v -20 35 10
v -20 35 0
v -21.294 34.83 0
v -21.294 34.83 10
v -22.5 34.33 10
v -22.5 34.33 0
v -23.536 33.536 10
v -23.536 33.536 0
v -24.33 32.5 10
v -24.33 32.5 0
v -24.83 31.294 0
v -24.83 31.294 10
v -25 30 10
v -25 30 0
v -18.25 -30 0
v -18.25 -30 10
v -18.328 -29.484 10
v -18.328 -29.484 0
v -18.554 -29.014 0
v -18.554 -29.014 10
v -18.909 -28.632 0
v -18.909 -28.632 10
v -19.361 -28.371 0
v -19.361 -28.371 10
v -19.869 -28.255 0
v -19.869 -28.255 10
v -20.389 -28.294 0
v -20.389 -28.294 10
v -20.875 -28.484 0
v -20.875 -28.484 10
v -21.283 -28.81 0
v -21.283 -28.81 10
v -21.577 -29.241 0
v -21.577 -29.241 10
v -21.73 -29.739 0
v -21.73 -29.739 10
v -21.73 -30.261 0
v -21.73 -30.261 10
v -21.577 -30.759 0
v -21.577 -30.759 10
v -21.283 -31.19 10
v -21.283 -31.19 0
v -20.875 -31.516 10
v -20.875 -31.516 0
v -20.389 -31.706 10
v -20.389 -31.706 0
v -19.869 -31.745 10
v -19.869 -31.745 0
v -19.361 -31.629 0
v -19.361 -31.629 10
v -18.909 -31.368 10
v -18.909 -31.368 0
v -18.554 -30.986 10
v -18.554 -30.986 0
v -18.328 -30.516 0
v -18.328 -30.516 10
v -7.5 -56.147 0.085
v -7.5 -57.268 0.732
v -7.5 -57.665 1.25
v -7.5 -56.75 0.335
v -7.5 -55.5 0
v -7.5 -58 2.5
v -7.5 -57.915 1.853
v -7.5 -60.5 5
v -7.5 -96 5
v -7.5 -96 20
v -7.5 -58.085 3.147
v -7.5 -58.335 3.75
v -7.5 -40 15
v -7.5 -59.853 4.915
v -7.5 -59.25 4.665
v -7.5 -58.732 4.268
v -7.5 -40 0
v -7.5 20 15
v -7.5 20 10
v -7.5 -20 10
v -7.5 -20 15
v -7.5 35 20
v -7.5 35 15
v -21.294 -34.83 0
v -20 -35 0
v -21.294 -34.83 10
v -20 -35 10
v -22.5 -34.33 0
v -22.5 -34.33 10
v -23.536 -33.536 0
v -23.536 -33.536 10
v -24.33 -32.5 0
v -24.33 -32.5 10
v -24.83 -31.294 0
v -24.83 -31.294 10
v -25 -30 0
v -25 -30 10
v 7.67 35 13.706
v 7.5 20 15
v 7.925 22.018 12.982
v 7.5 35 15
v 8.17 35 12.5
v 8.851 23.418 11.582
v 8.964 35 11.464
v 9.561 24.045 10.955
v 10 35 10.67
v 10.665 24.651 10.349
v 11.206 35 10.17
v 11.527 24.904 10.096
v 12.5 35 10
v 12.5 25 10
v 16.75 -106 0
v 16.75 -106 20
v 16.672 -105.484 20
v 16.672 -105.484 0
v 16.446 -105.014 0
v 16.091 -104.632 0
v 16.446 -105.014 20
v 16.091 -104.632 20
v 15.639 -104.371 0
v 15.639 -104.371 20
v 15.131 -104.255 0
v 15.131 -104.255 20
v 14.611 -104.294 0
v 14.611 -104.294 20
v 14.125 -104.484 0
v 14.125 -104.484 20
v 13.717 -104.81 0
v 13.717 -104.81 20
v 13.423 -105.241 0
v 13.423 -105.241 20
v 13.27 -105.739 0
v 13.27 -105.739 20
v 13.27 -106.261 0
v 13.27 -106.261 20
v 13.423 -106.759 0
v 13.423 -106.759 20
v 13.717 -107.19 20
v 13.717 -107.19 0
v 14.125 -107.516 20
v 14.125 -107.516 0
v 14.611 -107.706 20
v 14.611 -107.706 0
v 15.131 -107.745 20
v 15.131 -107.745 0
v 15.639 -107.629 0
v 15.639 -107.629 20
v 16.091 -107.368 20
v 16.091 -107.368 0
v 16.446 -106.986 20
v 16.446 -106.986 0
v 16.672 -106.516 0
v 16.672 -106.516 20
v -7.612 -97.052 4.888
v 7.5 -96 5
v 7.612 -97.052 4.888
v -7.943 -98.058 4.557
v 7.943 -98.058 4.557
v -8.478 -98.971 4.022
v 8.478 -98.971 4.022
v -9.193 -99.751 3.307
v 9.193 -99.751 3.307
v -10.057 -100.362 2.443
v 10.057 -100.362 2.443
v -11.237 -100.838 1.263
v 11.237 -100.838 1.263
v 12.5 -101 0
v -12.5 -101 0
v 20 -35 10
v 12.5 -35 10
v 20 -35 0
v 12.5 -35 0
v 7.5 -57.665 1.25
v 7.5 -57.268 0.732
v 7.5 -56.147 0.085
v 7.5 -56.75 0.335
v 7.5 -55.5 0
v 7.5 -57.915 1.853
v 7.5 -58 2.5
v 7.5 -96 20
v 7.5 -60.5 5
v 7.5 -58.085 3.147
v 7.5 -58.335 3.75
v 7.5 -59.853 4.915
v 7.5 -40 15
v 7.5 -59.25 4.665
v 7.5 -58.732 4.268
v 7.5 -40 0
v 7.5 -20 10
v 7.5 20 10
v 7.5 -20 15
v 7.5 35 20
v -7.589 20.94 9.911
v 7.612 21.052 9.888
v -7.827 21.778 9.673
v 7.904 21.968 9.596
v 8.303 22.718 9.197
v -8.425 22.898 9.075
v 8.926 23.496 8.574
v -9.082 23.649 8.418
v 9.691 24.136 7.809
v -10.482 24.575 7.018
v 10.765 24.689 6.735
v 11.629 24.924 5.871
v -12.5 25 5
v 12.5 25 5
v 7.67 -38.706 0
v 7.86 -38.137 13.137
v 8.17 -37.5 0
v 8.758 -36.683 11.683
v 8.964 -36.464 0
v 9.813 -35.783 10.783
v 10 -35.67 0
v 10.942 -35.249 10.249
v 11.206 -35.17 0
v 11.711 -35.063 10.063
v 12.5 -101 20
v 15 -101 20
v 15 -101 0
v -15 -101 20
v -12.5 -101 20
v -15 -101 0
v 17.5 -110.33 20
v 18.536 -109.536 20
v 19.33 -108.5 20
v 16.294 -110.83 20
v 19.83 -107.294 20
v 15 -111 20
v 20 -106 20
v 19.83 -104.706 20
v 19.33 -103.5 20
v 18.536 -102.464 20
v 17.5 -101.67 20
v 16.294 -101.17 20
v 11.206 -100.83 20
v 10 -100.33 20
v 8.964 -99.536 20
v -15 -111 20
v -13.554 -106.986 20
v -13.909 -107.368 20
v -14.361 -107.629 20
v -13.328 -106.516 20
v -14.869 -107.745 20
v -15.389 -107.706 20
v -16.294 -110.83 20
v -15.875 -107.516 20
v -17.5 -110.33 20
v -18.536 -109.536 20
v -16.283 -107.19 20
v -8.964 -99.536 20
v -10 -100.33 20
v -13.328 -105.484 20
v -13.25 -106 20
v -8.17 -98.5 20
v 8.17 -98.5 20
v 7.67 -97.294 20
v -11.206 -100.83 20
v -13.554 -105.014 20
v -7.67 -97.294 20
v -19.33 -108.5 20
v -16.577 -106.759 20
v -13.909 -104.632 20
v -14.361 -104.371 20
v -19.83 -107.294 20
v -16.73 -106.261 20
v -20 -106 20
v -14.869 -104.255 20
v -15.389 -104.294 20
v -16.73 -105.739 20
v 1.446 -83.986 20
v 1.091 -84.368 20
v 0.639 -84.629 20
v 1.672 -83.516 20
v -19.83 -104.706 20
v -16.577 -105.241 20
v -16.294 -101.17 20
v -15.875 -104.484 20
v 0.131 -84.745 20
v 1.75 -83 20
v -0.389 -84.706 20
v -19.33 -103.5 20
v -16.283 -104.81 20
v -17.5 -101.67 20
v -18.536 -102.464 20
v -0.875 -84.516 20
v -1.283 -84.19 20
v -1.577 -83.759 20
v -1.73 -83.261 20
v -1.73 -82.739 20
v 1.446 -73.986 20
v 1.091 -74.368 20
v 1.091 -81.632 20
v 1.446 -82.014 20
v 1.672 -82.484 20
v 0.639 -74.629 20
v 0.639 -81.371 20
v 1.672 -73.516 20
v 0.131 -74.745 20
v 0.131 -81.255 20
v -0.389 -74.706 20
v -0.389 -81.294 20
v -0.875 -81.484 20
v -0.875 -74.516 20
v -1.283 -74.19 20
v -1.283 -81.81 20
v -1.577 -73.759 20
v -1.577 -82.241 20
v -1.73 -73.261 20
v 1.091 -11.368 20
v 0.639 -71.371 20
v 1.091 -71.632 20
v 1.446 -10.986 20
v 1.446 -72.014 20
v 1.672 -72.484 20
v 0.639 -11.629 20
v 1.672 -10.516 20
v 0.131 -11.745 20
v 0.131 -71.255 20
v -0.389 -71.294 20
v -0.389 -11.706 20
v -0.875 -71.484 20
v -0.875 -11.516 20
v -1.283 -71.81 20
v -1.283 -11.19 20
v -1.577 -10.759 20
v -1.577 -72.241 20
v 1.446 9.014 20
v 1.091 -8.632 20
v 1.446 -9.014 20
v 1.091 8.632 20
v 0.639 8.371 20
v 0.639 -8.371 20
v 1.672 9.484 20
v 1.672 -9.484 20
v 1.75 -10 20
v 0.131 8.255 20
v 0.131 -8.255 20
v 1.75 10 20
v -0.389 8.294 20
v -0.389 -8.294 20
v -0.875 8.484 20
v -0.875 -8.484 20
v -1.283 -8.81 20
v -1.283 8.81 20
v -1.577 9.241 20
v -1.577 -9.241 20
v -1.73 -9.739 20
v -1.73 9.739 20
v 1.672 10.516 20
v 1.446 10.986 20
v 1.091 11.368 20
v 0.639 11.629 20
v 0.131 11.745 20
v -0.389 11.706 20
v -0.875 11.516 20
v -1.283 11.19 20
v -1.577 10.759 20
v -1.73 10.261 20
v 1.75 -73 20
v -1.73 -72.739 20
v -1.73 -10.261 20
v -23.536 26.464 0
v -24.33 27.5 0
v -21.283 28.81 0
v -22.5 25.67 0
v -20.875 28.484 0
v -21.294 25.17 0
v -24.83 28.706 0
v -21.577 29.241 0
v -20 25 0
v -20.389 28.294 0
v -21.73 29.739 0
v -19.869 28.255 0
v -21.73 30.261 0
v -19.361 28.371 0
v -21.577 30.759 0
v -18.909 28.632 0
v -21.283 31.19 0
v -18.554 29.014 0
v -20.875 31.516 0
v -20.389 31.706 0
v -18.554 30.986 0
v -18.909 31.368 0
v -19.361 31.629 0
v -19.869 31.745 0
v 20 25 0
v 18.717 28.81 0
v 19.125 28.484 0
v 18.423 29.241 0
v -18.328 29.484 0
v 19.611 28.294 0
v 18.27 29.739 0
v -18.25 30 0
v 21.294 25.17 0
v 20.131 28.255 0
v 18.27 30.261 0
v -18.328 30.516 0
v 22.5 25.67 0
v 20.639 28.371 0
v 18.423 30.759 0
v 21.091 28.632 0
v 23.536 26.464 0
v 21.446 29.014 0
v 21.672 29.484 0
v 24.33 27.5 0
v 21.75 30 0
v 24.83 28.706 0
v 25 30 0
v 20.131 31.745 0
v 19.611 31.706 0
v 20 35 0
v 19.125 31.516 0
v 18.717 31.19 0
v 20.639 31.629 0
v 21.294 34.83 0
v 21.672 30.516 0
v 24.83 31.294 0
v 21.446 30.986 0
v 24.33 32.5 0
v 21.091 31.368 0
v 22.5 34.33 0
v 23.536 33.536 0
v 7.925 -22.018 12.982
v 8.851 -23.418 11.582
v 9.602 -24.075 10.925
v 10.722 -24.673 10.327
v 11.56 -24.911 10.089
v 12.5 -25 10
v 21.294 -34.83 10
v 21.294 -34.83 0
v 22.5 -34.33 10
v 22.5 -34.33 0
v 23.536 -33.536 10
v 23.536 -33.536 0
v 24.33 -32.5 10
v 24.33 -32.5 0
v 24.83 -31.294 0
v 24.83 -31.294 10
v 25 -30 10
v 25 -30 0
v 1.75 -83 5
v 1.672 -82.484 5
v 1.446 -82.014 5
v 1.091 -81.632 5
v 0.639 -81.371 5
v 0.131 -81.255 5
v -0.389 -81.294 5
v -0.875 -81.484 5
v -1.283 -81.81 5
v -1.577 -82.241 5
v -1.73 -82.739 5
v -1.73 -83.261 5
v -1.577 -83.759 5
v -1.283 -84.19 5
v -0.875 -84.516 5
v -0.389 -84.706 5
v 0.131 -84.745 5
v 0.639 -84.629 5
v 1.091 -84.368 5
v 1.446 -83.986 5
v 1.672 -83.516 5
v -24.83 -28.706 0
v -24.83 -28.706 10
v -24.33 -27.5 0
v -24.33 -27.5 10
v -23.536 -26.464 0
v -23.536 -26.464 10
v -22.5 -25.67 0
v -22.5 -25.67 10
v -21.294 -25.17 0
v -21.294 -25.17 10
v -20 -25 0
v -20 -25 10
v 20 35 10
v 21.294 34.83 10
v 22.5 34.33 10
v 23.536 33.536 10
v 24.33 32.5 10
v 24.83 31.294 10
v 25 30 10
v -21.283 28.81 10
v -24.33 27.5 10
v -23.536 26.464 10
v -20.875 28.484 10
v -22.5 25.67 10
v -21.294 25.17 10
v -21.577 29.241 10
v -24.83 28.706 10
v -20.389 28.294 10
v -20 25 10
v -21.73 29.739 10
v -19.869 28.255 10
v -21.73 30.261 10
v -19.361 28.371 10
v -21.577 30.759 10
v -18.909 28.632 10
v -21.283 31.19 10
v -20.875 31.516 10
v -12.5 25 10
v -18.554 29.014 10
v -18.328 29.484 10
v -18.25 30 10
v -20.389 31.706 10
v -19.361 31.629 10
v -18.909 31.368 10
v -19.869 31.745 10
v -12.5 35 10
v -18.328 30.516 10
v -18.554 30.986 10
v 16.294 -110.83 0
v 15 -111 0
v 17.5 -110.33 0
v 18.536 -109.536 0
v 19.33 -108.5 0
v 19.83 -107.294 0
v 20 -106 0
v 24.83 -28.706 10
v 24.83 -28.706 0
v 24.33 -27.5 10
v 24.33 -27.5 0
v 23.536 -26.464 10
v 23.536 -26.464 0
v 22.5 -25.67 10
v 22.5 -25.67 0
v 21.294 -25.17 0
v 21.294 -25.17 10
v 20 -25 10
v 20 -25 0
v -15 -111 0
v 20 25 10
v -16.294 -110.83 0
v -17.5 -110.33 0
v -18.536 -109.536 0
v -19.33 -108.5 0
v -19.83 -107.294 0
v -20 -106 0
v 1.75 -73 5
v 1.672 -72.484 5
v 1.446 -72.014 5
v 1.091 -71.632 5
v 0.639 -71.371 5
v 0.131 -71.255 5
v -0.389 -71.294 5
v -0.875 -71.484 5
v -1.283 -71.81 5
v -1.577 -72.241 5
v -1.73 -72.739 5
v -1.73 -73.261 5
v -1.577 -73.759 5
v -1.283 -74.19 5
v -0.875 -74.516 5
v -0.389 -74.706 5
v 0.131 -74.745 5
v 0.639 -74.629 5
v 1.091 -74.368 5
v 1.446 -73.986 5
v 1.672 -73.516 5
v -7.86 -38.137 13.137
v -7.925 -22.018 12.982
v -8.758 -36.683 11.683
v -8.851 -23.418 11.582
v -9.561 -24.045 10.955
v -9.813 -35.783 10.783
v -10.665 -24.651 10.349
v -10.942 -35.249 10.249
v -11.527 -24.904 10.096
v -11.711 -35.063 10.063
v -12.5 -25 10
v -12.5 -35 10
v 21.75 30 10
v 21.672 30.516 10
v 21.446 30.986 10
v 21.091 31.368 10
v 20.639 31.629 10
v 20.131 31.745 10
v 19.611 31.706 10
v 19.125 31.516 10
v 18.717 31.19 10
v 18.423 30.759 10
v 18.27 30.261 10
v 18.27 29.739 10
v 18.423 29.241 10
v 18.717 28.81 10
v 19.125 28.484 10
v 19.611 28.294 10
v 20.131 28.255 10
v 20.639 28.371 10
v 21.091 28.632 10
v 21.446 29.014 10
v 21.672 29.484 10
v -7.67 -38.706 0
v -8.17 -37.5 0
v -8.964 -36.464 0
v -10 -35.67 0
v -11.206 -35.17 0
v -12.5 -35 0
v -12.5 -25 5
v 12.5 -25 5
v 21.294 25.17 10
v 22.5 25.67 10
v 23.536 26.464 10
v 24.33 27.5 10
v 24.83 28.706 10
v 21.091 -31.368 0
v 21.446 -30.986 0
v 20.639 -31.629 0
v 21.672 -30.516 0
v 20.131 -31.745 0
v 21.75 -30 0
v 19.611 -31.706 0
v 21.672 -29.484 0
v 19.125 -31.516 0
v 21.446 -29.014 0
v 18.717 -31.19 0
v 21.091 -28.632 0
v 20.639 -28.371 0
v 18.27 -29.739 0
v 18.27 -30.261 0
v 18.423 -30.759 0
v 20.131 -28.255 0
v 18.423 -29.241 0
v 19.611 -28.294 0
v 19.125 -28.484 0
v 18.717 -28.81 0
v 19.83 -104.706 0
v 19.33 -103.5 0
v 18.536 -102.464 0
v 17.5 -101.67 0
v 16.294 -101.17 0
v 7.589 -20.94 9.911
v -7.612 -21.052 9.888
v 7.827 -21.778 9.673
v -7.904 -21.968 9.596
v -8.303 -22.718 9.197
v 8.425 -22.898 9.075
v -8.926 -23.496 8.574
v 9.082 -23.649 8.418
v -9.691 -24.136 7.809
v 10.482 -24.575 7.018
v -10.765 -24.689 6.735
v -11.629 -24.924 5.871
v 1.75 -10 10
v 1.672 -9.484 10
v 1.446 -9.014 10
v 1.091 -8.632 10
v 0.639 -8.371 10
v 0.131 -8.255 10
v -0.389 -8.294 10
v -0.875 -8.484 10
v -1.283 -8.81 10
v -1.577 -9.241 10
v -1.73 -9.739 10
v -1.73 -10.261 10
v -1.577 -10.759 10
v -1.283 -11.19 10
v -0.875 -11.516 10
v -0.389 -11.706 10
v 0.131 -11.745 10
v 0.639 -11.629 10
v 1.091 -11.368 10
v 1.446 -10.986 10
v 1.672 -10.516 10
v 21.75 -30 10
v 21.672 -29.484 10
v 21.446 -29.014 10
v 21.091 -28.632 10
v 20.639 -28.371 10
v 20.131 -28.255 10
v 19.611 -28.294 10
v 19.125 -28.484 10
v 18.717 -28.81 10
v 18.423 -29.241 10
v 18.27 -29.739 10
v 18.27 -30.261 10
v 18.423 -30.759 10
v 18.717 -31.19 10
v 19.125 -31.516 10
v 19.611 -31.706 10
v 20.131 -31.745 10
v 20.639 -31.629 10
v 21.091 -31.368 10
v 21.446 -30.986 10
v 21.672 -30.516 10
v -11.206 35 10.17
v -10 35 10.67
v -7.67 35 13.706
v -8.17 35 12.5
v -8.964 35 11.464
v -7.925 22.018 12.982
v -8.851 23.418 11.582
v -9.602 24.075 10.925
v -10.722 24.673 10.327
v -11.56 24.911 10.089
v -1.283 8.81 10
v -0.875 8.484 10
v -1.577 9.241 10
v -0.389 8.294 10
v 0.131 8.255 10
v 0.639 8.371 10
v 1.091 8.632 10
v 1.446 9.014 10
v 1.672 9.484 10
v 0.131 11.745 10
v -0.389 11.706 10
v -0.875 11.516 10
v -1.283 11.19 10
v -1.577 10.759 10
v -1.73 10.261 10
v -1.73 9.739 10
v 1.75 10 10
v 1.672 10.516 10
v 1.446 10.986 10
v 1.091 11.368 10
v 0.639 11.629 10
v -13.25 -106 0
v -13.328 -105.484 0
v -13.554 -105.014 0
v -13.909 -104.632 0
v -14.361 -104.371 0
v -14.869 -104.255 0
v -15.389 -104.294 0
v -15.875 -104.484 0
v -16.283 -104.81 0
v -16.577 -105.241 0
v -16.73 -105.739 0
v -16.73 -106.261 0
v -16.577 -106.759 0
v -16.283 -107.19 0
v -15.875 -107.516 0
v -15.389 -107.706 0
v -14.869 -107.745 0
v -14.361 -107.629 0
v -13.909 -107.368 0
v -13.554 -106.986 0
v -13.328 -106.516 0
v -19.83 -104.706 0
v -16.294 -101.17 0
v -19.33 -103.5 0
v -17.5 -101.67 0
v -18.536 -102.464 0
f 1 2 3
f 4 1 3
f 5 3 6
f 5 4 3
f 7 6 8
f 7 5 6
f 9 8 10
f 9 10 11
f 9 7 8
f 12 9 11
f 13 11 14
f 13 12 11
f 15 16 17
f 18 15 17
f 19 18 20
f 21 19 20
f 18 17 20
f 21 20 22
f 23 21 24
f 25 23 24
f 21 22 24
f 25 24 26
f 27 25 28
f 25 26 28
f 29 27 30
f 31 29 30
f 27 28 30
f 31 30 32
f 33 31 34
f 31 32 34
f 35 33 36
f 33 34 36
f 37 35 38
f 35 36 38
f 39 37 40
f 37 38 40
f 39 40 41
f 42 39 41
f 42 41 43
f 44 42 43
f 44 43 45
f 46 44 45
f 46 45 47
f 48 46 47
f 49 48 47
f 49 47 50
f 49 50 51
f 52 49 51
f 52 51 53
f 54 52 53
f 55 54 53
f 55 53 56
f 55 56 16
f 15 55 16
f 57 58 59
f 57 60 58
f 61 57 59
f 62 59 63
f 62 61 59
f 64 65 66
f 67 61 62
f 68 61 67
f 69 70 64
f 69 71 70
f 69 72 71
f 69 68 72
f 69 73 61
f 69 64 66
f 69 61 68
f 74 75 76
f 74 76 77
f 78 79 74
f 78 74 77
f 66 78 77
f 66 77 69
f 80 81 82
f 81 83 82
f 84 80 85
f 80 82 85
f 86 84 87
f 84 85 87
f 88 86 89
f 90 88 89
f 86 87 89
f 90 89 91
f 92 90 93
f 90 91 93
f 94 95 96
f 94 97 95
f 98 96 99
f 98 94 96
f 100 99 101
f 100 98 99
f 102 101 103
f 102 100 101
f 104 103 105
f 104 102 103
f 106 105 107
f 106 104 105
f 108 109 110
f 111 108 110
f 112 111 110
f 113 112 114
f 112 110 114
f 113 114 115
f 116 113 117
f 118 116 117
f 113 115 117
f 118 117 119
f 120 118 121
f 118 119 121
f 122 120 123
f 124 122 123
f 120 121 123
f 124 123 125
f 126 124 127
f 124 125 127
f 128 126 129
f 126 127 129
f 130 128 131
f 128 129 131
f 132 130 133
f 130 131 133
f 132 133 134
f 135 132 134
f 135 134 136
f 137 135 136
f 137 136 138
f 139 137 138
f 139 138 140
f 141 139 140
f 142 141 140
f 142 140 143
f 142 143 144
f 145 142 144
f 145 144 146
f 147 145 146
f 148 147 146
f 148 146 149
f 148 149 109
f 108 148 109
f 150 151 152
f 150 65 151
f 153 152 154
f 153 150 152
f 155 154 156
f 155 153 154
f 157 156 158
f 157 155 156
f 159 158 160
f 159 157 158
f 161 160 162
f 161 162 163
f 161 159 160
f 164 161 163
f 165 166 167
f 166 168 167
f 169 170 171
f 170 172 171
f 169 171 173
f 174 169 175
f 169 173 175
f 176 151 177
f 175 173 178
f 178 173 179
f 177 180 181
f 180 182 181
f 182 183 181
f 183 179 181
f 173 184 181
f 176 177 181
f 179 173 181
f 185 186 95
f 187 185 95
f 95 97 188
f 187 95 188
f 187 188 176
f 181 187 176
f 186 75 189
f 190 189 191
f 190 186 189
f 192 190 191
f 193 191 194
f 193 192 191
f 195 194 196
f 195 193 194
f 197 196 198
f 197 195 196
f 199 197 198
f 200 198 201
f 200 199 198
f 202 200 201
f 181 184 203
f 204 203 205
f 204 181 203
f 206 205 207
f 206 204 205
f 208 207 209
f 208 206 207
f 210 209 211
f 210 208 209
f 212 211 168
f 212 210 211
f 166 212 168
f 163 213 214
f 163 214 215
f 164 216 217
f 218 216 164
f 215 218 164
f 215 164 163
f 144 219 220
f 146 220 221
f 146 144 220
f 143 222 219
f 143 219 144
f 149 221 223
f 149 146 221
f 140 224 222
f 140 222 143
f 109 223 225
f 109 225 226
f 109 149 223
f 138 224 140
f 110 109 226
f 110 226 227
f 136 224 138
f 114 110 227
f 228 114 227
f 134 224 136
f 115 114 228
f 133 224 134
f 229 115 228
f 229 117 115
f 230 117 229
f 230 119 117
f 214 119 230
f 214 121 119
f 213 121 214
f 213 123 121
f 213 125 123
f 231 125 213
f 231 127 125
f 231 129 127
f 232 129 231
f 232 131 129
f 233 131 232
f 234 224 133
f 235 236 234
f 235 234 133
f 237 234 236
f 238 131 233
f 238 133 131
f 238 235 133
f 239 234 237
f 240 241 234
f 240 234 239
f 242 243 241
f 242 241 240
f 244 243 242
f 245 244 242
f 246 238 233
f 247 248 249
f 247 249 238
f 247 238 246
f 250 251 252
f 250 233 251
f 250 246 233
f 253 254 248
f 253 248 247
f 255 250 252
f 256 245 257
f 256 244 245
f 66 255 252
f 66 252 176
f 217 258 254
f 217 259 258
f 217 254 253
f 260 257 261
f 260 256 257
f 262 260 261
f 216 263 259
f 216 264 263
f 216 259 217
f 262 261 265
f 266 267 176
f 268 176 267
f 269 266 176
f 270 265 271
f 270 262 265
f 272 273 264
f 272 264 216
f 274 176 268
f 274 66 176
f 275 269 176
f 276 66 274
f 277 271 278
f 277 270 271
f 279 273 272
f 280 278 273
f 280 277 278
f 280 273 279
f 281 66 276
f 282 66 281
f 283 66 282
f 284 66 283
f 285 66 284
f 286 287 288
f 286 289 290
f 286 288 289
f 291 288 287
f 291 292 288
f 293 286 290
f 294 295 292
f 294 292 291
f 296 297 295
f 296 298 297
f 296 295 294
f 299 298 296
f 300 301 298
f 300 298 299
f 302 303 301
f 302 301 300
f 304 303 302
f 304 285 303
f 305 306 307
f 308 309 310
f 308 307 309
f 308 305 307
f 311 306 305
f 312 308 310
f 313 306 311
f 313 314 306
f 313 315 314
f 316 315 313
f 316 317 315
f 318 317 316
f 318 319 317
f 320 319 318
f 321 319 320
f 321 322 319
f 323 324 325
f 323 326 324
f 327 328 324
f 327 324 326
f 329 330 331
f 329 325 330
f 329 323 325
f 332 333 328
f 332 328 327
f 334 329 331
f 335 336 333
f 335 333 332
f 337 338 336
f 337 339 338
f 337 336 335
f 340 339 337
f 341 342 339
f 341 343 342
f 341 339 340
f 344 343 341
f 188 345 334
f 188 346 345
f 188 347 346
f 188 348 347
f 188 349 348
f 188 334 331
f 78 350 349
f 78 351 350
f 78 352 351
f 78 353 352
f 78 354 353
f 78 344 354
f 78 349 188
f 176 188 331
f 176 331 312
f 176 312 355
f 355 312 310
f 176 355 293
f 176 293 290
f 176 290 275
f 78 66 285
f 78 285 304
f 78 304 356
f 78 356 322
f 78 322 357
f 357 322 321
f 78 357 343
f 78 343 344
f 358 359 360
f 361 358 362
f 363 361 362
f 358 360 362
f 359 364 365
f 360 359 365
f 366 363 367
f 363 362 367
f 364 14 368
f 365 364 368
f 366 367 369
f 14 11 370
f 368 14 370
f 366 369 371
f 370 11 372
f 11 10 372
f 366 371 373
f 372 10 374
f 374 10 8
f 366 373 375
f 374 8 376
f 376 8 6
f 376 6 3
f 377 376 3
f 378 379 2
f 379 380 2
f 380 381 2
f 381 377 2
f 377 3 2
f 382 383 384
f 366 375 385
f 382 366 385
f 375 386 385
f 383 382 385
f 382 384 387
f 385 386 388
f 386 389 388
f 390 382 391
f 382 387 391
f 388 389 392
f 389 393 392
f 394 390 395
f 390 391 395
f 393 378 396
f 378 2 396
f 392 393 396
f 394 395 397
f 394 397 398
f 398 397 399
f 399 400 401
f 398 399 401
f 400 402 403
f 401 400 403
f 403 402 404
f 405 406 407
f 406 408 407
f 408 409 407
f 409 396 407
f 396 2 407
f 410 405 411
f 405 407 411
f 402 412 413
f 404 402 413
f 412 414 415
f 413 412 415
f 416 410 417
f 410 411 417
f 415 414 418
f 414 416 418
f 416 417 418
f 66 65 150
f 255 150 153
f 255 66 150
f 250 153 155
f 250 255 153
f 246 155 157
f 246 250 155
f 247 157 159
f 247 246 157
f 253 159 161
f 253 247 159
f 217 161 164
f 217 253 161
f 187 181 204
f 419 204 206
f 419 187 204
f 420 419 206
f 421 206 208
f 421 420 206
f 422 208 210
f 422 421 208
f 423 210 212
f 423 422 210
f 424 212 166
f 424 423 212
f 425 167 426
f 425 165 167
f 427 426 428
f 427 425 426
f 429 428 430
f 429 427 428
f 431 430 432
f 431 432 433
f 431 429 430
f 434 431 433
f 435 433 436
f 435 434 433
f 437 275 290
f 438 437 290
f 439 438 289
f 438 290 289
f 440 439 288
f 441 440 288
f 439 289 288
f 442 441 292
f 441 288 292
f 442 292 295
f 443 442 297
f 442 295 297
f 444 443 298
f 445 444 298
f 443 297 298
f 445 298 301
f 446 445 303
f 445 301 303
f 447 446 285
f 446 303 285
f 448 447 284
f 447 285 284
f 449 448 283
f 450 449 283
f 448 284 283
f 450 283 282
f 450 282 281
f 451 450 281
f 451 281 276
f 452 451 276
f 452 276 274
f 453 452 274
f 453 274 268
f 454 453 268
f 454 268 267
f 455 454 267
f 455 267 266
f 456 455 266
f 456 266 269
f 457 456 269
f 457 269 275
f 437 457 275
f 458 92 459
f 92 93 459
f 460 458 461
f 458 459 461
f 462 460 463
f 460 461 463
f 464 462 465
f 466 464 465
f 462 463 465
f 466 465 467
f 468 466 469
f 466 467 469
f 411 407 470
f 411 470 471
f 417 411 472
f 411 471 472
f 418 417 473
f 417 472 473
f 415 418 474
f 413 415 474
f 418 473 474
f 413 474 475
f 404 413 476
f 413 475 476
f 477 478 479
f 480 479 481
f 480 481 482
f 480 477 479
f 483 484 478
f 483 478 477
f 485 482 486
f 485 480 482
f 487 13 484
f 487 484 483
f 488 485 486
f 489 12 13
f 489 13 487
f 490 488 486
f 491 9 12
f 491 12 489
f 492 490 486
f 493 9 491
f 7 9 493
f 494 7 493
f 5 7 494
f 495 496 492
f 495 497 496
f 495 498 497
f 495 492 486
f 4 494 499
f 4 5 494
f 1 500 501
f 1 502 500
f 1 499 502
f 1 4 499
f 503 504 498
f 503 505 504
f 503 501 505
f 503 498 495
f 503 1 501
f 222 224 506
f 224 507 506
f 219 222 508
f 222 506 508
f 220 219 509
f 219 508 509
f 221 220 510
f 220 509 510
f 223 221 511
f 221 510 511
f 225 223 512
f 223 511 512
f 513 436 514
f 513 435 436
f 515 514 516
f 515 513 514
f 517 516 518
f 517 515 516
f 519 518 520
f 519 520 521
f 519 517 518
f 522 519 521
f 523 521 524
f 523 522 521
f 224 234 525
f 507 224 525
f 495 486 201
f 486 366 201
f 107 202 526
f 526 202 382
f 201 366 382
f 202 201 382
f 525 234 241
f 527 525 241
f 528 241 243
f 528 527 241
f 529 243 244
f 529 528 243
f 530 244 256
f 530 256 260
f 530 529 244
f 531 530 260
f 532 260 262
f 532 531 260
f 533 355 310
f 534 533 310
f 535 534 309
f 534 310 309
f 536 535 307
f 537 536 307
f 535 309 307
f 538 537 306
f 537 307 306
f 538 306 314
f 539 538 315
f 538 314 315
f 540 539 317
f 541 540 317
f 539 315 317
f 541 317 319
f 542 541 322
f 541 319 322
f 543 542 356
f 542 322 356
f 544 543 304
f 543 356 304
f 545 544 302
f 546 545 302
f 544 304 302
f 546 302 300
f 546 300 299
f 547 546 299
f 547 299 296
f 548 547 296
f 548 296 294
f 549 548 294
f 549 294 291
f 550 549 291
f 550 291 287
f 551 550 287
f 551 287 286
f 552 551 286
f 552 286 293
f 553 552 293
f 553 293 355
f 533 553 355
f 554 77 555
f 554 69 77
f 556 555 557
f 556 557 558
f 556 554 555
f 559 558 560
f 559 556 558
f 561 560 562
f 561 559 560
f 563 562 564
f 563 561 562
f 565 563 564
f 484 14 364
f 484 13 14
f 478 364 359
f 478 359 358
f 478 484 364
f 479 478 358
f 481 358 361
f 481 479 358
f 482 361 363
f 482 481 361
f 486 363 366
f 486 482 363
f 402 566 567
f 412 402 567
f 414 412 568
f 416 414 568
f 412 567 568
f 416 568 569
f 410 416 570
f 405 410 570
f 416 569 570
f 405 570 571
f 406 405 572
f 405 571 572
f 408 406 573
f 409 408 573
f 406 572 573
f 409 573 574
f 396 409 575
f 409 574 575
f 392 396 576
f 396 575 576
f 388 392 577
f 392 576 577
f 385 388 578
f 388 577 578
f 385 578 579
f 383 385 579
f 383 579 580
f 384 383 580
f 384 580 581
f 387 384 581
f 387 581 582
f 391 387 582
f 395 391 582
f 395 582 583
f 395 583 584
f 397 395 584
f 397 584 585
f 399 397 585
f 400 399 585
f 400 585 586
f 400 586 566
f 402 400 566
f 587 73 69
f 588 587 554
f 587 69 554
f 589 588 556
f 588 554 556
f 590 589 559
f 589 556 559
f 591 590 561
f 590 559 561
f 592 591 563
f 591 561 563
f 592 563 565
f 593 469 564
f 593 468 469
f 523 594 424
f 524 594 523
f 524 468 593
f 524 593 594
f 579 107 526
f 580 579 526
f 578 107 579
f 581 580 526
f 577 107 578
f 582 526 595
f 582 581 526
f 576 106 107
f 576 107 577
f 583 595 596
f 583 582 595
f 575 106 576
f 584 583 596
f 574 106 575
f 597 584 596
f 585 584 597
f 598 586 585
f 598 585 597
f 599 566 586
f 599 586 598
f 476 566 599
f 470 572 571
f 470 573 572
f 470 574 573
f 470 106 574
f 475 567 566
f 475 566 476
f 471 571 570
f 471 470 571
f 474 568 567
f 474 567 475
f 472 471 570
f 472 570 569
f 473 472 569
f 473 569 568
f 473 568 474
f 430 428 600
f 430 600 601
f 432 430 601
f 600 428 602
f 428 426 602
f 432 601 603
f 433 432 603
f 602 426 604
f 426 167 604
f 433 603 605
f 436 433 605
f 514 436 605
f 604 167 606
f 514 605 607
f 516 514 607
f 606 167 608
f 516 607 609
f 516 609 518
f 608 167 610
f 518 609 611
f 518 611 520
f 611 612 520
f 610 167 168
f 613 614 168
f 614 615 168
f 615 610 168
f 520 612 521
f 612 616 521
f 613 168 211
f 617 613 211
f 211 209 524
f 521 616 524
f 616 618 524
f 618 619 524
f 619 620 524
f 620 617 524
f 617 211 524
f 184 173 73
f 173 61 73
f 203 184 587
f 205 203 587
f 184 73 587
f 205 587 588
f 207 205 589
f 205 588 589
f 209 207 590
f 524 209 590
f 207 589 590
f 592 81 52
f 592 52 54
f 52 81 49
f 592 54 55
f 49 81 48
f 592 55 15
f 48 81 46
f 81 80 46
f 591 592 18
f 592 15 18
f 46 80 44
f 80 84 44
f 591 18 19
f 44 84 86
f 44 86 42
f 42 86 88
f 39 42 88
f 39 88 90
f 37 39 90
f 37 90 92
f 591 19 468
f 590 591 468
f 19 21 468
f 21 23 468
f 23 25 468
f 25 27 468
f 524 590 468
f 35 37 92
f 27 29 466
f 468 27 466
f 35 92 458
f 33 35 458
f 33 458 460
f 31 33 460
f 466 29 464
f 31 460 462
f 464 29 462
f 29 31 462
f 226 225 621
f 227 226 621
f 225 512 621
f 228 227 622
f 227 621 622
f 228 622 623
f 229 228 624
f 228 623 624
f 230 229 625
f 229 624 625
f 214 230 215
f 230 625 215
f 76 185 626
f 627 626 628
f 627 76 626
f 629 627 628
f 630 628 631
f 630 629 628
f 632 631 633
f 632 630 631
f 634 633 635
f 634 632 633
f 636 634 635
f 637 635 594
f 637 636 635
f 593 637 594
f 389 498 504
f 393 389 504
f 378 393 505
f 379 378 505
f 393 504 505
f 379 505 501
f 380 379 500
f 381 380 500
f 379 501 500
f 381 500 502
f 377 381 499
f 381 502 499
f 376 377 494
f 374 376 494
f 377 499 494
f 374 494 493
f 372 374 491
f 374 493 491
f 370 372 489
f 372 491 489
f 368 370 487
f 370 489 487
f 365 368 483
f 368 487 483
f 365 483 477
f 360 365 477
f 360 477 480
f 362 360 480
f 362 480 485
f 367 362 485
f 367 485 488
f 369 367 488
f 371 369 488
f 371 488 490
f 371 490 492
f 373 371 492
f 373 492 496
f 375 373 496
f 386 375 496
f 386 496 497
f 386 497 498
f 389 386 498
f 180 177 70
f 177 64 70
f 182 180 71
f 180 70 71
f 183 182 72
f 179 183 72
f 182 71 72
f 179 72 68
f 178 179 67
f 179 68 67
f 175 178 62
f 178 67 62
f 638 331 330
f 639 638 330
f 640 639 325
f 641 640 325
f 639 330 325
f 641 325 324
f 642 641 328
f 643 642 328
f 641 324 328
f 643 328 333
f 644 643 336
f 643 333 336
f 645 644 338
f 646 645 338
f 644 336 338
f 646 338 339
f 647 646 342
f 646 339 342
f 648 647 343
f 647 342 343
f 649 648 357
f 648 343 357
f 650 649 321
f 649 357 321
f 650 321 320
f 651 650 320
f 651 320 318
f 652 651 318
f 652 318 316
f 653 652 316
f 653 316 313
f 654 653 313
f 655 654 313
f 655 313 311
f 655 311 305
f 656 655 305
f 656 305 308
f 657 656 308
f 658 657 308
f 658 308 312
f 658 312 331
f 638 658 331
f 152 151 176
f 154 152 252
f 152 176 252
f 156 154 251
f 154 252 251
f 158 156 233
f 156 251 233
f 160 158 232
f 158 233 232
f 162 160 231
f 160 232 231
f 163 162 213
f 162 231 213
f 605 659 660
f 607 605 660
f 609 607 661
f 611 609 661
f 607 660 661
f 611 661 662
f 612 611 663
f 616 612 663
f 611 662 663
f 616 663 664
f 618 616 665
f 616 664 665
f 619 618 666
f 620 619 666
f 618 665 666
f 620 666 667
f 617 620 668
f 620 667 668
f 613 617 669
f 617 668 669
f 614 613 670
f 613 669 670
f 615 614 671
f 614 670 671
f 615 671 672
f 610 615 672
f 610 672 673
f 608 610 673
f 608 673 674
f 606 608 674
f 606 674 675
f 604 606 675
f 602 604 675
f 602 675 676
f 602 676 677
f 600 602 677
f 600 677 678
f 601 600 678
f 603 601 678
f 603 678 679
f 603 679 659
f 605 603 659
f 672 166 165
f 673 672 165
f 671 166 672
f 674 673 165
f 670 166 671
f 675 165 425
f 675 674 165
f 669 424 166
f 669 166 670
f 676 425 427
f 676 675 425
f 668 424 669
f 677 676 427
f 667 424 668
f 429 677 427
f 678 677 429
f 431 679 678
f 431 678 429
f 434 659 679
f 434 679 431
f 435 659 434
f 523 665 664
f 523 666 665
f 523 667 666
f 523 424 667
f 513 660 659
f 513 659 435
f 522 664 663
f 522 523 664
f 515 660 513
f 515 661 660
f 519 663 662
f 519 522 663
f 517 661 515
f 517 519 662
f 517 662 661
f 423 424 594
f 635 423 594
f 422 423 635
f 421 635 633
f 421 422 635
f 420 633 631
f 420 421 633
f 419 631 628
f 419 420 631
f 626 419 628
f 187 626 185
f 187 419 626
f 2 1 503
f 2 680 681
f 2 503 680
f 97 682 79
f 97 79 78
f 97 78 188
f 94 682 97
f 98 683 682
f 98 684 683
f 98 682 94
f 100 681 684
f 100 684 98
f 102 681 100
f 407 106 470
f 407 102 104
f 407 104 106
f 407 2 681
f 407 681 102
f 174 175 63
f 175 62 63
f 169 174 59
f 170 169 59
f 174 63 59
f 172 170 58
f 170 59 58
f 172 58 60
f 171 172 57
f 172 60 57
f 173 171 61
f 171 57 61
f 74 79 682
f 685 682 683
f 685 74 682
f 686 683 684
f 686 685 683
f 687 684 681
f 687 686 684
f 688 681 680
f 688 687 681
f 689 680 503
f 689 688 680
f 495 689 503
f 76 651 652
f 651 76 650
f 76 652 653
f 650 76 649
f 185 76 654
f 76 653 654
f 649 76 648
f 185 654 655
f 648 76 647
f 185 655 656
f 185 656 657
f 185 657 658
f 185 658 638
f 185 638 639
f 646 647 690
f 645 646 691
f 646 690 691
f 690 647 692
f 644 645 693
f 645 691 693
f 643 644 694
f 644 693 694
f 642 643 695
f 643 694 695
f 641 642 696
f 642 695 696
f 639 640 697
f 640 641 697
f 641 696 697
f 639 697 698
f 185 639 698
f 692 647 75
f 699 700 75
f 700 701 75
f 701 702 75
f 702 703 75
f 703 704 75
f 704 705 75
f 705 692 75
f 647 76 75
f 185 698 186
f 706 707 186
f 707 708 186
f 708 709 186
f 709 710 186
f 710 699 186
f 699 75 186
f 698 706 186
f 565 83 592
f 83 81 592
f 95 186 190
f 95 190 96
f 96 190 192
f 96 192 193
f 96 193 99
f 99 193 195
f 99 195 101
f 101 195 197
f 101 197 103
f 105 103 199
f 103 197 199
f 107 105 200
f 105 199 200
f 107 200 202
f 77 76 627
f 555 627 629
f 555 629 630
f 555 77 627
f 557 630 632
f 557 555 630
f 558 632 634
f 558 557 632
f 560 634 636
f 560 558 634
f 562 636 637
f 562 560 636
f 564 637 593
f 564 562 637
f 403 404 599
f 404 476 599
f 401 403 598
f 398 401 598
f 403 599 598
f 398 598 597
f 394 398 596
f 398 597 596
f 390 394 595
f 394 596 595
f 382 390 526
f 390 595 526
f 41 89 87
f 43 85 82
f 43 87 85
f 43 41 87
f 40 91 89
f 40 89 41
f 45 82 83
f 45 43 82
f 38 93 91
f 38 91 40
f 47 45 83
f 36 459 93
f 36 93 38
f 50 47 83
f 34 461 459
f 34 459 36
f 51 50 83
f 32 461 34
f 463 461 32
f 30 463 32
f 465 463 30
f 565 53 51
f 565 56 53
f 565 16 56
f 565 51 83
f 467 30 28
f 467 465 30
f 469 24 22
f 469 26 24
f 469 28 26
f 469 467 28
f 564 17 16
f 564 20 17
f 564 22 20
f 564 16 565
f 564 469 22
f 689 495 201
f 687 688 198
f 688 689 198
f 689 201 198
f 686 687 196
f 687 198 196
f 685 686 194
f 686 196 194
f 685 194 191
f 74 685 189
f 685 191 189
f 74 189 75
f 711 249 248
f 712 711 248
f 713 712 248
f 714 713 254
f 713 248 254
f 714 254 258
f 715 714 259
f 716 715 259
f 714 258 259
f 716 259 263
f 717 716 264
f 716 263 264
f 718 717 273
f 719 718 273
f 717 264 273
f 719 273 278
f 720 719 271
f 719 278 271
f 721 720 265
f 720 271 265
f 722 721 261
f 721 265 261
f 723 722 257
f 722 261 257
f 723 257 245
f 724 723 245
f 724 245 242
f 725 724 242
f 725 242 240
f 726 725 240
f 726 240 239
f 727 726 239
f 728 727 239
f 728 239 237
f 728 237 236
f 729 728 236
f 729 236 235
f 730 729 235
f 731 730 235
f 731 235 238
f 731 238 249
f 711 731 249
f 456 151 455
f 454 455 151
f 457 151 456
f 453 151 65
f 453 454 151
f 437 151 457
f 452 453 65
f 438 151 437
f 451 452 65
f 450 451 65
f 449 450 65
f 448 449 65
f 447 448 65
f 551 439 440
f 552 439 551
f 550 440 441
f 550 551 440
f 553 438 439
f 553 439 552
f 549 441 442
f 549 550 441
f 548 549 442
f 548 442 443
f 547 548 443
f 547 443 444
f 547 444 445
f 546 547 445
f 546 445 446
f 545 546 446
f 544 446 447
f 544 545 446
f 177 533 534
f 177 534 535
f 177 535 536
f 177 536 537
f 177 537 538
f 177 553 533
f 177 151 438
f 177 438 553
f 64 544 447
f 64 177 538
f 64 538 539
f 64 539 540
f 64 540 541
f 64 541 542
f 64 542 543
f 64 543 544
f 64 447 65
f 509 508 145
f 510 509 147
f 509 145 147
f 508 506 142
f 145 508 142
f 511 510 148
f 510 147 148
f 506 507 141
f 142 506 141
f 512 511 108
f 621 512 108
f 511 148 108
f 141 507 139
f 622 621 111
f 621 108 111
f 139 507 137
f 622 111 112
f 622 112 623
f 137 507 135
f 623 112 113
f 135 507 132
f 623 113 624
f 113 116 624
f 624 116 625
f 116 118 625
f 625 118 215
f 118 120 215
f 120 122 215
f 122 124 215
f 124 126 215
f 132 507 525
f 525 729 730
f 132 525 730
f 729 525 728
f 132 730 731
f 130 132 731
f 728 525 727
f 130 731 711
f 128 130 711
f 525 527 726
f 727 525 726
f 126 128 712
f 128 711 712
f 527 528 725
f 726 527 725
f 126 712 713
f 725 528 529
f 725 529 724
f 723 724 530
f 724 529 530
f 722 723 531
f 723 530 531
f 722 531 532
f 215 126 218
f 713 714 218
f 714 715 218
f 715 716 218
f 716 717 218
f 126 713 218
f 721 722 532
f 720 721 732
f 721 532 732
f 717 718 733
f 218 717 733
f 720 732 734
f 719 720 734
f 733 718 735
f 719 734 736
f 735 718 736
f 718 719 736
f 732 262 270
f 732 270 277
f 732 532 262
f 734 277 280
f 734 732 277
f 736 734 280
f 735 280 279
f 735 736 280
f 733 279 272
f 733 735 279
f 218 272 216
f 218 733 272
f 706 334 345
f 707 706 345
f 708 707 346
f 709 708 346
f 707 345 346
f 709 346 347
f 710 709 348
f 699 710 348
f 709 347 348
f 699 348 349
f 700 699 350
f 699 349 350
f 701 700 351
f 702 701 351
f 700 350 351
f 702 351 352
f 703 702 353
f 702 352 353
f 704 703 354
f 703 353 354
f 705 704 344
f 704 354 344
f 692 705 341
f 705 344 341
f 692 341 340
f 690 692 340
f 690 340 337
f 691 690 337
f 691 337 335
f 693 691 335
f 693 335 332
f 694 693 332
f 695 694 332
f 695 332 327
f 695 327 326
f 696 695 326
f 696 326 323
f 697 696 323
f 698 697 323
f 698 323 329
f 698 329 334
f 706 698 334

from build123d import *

# Parameters (mm, degrees)
SKETCH1_W                = 50
SKETCH1_H                = 10
BOSS_EXTRUDE1_DEPTH      = 10
BOSS_EXTRUDE1_2_DEPTH    = 10
SKETCH2_W                = 15
SKETCH2_H                = 70
BOSS_EXTRUDE2_DEPTH      = 10
CUT_EXTRUDE1_REACH       = 49.434
SKETCH3_R                = 1.75
CUT_EXTRUDE2_REACH       = 46.159
SKETCH4_R                = 1.75
FILLET2_R                = 5
FILLET4_R                = 5
FILLET5_R                = 5
FILLET6_R                = 5
SKETCH5_W                = 15
SKETCH5_H                = 20
BOSS_EXTRUDE3_DEPTH      = 66
BOSS_EXTRUDE4_DEPTH      = 20
BOSS_EXTRUDE4_DEPTH_BACK = 20
SKETCH6_W                = 20
SKETCH6_H                = 10
CUT_EXTRUDE3_REACH       = 117.525
SKETCH7_R                = 1.75
FILLET7_R                = 5
FILLET9_R                = 5
FILLET10_R               = 5
SKETCH8_R                = 1.75
CUT_EXTRUDE4_DEPTH       = 116.524889093
SKETCH11_W               = 15
SKETCH11_H               = 43
CUT_EXTRUDE5_DEPTH       = 5
FILLET11_R               = 5
FILLET13_R               = 2.5


# Some blends are built 0.0001 mm under size
with BuildPart() as part:
    # Sketch1 → Boss-Extrude1 (new body)
    with BuildSketch(Plane.XY):
        with Locations((0, 30)):
            Rectangle(SKETCH1_W, SKETCH1_H)
    extrude(amount=BOSS_EXTRUDE1_DEPTH)



with BuildPart() as body_2:
    # Sketch1 → Boss-Extrude1 2 (new body)
    with BuildSketch(Plane.XY):
        with Locations((0, -30)):
            Rectangle(SKETCH1_W, SKETCH1_H)
    extrude(amount=BOSS_EXTRUDE1_2_DEPTH)


with BuildPart() as part_1:
    add(part.part)

    add(body_2.part)  # Boss-Extrude2 merges body 2
    # Sketch2 → Boss-Extrude2 (add)
    with BuildSketch(Plane.XY.offset(10)):
        Rectangle(SKETCH2_W, SKETCH2_H)
    extrude(amount=BOSS_EXTRUDE2_DEPTH)

    # Sketch3 → Cut-Extrude1 (cut, up to next)
    with BuildSketch(Plane.XY.offset(20), mode=Mode.PRIVATE) as cut_extrude1_sk1:
        with Locations((0, 10)):
            Circle(SKETCH3_R)
    cut_extrude1_tool1 = extrude(cut_extrude1_sk1.sketch, amount=-CUT_EXTRUDE1_REACH, mode=Mode.PRIVATE) & part_1.part
    # Sketch3 → Cut-Extrude1 (cut, up to next)
    with BuildSketch(Plane.XY.offset(20), mode=Mode.PRIVATE) as cut_extrude1_sk2:
        with Locations((0, -10)):
            Circle(SKETCH3_R)
    cut_extrude1_tool2 = extrude(cut_extrude1_sk2.sketch, amount=-CUT_EXTRUDE1_REACH, mode=Mode.PRIVATE) & part_1.part
    add(cut_extrude1_tool1.solids().sort_by_distance((0, 10, 20))[0], mode=Mode.SUBTRACT)
    add(cut_extrude1_tool2.solids().sort_by_distance((0, -10, 20))[0], mode=Mode.SUBTRACT)

    # Sketch4 → Cut-Extrude2 (cut, up to next)
    with BuildSketch(Plane.XY.offset(10), mode=Mode.PRIVATE) as cut_extrude2_sk1:
        with Locations((-20, 30)):
            Circle(SKETCH4_R)
    cut_extrude2_tool1 = extrude(cut_extrude2_sk1.sketch, amount=-CUT_EXTRUDE2_REACH, mode=Mode.PRIVATE) & part_1.part
    # Sketch4 → Cut-Extrude2 (cut, up to next)
    with BuildSketch(Plane.XY.offset(10), mode=Mode.PRIVATE) as cut_extrude2_sk2:
        with Locations((-20, -30)):
            Circle(SKETCH4_R)
    cut_extrude2_tool2 = extrude(cut_extrude2_sk2.sketch, amount=-CUT_EXTRUDE2_REACH, mode=Mode.PRIVATE) & part_1.part
    # Sketch4 → Cut-Extrude2 (cut, up to next)
    with BuildSketch(Plane.XY.offset(10), mode=Mode.PRIVATE) as cut_extrude2_sk3:
        with Locations((20, 30)):
            Circle(SKETCH4_R)
    cut_extrude2_tool3 = extrude(cut_extrude2_sk3.sketch, amount=-CUT_EXTRUDE2_REACH, mode=Mode.PRIVATE) & part_1.part
    # Sketch4 → Cut-Extrude2 (cut, up to next)
    with BuildSketch(Plane.XY.offset(10), mode=Mode.PRIVATE) as cut_extrude2_sk4:
        with Locations((20, -30)):
            Circle(SKETCH4_R)
    cut_extrude2_tool4 = extrude(cut_extrude2_sk4.sketch, amount=-CUT_EXTRUDE2_REACH, mode=Mode.PRIVATE) & part_1.part
    add(cut_extrude2_tool1.solids().sort_by_distance((-20, 30, 10))[0], mode=Mode.SUBTRACT)
    add(cut_extrude2_tool2.solids().sort_by_distance((-20, -30, 10))[0], mode=Mode.SUBTRACT)
    add(cut_extrude2_tool3.solids().sort_by_distance((20, 30, 10))[0], mode=Mode.SUBTRACT)
    add(cut_extrude2_tool4.solids().sort_by_distance((20, -30, 10))[0], mode=Mode.SUBTRACT)

    # Fillet2
    fillet2_edges = [part_1.edges().sort_by_distance(p)[0] for p in [
        (25, -35, 5),
        (25, -25, 5),
        (25, 35, 5),
        (25, 25, 5),
        (-25, 35, 5),
        (-25, 25, 5),
        (-25, -25, 5),
        (-25, -35, 5),
    ]]
    fillet(fillet2_edges, radius=FILLET2_R - 0.0001)  # a hair under: the kernel refuses the full size

    # Fillet4
    # the kernel refuses this fillet: 5 mm, written as the material it adds along each edge
    with BuildSketch(Plane(origin=(7.5, 25, 10), x_dir=(0, 0, -1), z_dir=(-1, 0, 0))) as fillet4_piece_1:
        with BuildLine():
            CenterArc((FILLET4_R, FILLET4_R), FILLET4_R, 180, 90)
            Line((0, FILLET4_R), (0, 0))
            Line((0, 0), (FILLET4_R, 0))
        make_face()
    extrude(amount=15)
    with BuildSketch(Plane(origin=(-7.5, -25, 10), x_dir=(0, 1, 0), z_dir=(1, 0, 0))) as fillet4_piece_2:
        with BuildLine():
            CenterArc((FILLET4_R, -FILLET4_R), FILLET4_R, 90, 90)
            Line((0, -FILLET4_R), (0, 0))
            Line((0, 0), (FILLET4_R, 0))
        make_face()
    extrude(amount=15)

    # Fillet5
    fillet5_edges = [part_1.edges().sort_by_distance(p)[0] for p in [
        (7.5, -25, 7.5),
        (7.5, 25, 7.5),
    ]]
    fillet(fillet5_edges, radius=FILLET5_R - 0.0001)  # a hair under: the kernel refuses the full size

    # Fillet6
    fillet6_edges = [part_1.edges().sort_by_distance(p)[0] for p in [
        (-7.5, -25, 7.5),
        (-7.5, 25, 7.5),
    ]]
    fillet(fillet6_edges, radius=FILLET6_R - 0.0001)  # a hair under: the kernel refuses the full size

    # Sketch5 → Boss-Extrude3 (add)
    with BuildSketch(Plane.XZ.offset(35)):
        with Locations((0, 10)):
            Rectangle(SKETCH5_W, SKETCH5_H)
    extrude(amount=BOSS_EXTRUDE3_DEPTH)

    # Sketch6 → Boss-Extrude4 (add, two sides: drawn at the far end of the back side and taken through both)
    with BuildSketch(Plane(origin=(0, 0, 0), x_dir=(0, 0, -1), z_dir=(1, 0, 0)).offset(-BOSS_EXTRUDE4_DEPTH_BACK)):
        with Locations((-10, -106)):
            Rectangle(SKETCH6_W, SKETCH6_H)
    extrude(amount=BOSS_EXTRUDE4_DEPTH + BOSS_EXTRUDE4_DEPTH_BACK)

    # Sketch7 → Cut-Extrude3 (cut, up to next)
    with BuildSketch(Plane.XY.offset(20), mode=Mode.PRIVATE) as cut_extrude3_sk1:
        with Locations((-15, -106)):
            Circle(SKETCH7_R)
    cut_extrude3_tool1 = extrude(cut_extrude3_sk1.sketch, amount=-CUT_EXTRUDE3_REACH, mode=Mode.PRIVATE) & part_1.part
    # Sketch7 → Cut-Extrude3 (cut, up to next)
    with BuildSketch(Plane.XY.offset(20), mode=Mode.PRIVATE) as cut_extrude3_sk2:
        with Locations((15, -106)):
            Circle(SKETCH7_R)
    cut_extrude3_tool2 = extrude(cut_extrude3_sk2.sketch, amount=-CUT_EXTRUDE3_REACH, mode=Mode.PRIVATE) & part_1.part
    add(cut_extrude3_tool1.solids().sort_by_distance((-15, -106, 20))[0], mode=Mode.SUBTRACT)
    add(cut_extrude3_tool2.solids().sort_by_distance((15, -106, 20))[0], mode=Mode.SUBTRACT)

    # Fillet7
    fillet7_edges = [part_1.edges().sort_by_distance(p)[0] for p in [
        (20, -111, 10),
        (20, -101, 10),
        (-20, -111, 10),
        (-20, -101, 10),
    ]]
    fillet(fillet7_edges, radius=FILLET7_R - 0.0001)  # a hair under: the kernel refuses the full size

    # Fillet9
    fillet9_edges = [part_1.edges().sort_by_distance(p)[0] for p in [
        (-7.5, -35, 5),
        (7.5, -35, 5),
    ]]
    fillet(fillet9_edges, radius=FILLET9_R)

    # Fillet10
    fillet10_edges = [part_1.edges().sort_by_distance(p)[0] for p in [
        (7.5, -30.00005, 10),
        (7.5, 27.50005, 10),
        (-7.5, -30.00005, 10),
        (-7.5, 27.50005, 10),
    ]]
    fillet(fillet10_edges, radius=FILLET10_R)

    # Sketch8 → Cut-Extrude4 (cut, through all)
    with BuildSketch(Plane.XY.offset(20)):
        with Locations((0, -73)):
            Circle(SKETCH8_R)
        with Locations((0, -83)):
            Circle(SKETCH8_R)
    extrude(amount=-CUT_EXTRUDE4_DEPTH, mode=Mode.SUBTRACT)

    # Sketch11 → Cut-Extrude5 (cut)
    with BuildSketch(Plane(origin=(0, 0, 0), x_dir=(-1, 0, 0), z_dir=(0, 0, -1))):
        with Locations((0, -79.5)):
            Rectangle(SKETCH11_W, SKETCH11_H)
    extrude(amount=-CUT_EXTRUDE5_DEPTH, mode=Mode.SUBTRACT)

    # Fillet11
    fillet11_edges = [part_1.edges().sort_by_distance(p)[0] for p in [
        (-7.5, -101, 12.5),
        (7.5, -101, 12.5),
        (0, -101, 5),
    ]]
    fillet(fillet11_edges, radius=FILLET11_R - 0.0001)  # a hair under: the kernel refuses the full size

    # Fillet13
    fillet13_edges = [part_1.edges().sort_by_distance(p)[0] for p in [
        (0, -58, 5),
    ]]
    fillet(fillet13_edges, radius=FILLET13_R)
    fillet13_2_edges = [part_1.edges().sort_by_distance(p)[0] for p in [
        (0, -58, 0),
    ]]
    fillet(fillet13_2_edges, radius=FILLET13_R - 0.0001)  # a hair under: the kernel refuses the full size


solid = part_1.part
